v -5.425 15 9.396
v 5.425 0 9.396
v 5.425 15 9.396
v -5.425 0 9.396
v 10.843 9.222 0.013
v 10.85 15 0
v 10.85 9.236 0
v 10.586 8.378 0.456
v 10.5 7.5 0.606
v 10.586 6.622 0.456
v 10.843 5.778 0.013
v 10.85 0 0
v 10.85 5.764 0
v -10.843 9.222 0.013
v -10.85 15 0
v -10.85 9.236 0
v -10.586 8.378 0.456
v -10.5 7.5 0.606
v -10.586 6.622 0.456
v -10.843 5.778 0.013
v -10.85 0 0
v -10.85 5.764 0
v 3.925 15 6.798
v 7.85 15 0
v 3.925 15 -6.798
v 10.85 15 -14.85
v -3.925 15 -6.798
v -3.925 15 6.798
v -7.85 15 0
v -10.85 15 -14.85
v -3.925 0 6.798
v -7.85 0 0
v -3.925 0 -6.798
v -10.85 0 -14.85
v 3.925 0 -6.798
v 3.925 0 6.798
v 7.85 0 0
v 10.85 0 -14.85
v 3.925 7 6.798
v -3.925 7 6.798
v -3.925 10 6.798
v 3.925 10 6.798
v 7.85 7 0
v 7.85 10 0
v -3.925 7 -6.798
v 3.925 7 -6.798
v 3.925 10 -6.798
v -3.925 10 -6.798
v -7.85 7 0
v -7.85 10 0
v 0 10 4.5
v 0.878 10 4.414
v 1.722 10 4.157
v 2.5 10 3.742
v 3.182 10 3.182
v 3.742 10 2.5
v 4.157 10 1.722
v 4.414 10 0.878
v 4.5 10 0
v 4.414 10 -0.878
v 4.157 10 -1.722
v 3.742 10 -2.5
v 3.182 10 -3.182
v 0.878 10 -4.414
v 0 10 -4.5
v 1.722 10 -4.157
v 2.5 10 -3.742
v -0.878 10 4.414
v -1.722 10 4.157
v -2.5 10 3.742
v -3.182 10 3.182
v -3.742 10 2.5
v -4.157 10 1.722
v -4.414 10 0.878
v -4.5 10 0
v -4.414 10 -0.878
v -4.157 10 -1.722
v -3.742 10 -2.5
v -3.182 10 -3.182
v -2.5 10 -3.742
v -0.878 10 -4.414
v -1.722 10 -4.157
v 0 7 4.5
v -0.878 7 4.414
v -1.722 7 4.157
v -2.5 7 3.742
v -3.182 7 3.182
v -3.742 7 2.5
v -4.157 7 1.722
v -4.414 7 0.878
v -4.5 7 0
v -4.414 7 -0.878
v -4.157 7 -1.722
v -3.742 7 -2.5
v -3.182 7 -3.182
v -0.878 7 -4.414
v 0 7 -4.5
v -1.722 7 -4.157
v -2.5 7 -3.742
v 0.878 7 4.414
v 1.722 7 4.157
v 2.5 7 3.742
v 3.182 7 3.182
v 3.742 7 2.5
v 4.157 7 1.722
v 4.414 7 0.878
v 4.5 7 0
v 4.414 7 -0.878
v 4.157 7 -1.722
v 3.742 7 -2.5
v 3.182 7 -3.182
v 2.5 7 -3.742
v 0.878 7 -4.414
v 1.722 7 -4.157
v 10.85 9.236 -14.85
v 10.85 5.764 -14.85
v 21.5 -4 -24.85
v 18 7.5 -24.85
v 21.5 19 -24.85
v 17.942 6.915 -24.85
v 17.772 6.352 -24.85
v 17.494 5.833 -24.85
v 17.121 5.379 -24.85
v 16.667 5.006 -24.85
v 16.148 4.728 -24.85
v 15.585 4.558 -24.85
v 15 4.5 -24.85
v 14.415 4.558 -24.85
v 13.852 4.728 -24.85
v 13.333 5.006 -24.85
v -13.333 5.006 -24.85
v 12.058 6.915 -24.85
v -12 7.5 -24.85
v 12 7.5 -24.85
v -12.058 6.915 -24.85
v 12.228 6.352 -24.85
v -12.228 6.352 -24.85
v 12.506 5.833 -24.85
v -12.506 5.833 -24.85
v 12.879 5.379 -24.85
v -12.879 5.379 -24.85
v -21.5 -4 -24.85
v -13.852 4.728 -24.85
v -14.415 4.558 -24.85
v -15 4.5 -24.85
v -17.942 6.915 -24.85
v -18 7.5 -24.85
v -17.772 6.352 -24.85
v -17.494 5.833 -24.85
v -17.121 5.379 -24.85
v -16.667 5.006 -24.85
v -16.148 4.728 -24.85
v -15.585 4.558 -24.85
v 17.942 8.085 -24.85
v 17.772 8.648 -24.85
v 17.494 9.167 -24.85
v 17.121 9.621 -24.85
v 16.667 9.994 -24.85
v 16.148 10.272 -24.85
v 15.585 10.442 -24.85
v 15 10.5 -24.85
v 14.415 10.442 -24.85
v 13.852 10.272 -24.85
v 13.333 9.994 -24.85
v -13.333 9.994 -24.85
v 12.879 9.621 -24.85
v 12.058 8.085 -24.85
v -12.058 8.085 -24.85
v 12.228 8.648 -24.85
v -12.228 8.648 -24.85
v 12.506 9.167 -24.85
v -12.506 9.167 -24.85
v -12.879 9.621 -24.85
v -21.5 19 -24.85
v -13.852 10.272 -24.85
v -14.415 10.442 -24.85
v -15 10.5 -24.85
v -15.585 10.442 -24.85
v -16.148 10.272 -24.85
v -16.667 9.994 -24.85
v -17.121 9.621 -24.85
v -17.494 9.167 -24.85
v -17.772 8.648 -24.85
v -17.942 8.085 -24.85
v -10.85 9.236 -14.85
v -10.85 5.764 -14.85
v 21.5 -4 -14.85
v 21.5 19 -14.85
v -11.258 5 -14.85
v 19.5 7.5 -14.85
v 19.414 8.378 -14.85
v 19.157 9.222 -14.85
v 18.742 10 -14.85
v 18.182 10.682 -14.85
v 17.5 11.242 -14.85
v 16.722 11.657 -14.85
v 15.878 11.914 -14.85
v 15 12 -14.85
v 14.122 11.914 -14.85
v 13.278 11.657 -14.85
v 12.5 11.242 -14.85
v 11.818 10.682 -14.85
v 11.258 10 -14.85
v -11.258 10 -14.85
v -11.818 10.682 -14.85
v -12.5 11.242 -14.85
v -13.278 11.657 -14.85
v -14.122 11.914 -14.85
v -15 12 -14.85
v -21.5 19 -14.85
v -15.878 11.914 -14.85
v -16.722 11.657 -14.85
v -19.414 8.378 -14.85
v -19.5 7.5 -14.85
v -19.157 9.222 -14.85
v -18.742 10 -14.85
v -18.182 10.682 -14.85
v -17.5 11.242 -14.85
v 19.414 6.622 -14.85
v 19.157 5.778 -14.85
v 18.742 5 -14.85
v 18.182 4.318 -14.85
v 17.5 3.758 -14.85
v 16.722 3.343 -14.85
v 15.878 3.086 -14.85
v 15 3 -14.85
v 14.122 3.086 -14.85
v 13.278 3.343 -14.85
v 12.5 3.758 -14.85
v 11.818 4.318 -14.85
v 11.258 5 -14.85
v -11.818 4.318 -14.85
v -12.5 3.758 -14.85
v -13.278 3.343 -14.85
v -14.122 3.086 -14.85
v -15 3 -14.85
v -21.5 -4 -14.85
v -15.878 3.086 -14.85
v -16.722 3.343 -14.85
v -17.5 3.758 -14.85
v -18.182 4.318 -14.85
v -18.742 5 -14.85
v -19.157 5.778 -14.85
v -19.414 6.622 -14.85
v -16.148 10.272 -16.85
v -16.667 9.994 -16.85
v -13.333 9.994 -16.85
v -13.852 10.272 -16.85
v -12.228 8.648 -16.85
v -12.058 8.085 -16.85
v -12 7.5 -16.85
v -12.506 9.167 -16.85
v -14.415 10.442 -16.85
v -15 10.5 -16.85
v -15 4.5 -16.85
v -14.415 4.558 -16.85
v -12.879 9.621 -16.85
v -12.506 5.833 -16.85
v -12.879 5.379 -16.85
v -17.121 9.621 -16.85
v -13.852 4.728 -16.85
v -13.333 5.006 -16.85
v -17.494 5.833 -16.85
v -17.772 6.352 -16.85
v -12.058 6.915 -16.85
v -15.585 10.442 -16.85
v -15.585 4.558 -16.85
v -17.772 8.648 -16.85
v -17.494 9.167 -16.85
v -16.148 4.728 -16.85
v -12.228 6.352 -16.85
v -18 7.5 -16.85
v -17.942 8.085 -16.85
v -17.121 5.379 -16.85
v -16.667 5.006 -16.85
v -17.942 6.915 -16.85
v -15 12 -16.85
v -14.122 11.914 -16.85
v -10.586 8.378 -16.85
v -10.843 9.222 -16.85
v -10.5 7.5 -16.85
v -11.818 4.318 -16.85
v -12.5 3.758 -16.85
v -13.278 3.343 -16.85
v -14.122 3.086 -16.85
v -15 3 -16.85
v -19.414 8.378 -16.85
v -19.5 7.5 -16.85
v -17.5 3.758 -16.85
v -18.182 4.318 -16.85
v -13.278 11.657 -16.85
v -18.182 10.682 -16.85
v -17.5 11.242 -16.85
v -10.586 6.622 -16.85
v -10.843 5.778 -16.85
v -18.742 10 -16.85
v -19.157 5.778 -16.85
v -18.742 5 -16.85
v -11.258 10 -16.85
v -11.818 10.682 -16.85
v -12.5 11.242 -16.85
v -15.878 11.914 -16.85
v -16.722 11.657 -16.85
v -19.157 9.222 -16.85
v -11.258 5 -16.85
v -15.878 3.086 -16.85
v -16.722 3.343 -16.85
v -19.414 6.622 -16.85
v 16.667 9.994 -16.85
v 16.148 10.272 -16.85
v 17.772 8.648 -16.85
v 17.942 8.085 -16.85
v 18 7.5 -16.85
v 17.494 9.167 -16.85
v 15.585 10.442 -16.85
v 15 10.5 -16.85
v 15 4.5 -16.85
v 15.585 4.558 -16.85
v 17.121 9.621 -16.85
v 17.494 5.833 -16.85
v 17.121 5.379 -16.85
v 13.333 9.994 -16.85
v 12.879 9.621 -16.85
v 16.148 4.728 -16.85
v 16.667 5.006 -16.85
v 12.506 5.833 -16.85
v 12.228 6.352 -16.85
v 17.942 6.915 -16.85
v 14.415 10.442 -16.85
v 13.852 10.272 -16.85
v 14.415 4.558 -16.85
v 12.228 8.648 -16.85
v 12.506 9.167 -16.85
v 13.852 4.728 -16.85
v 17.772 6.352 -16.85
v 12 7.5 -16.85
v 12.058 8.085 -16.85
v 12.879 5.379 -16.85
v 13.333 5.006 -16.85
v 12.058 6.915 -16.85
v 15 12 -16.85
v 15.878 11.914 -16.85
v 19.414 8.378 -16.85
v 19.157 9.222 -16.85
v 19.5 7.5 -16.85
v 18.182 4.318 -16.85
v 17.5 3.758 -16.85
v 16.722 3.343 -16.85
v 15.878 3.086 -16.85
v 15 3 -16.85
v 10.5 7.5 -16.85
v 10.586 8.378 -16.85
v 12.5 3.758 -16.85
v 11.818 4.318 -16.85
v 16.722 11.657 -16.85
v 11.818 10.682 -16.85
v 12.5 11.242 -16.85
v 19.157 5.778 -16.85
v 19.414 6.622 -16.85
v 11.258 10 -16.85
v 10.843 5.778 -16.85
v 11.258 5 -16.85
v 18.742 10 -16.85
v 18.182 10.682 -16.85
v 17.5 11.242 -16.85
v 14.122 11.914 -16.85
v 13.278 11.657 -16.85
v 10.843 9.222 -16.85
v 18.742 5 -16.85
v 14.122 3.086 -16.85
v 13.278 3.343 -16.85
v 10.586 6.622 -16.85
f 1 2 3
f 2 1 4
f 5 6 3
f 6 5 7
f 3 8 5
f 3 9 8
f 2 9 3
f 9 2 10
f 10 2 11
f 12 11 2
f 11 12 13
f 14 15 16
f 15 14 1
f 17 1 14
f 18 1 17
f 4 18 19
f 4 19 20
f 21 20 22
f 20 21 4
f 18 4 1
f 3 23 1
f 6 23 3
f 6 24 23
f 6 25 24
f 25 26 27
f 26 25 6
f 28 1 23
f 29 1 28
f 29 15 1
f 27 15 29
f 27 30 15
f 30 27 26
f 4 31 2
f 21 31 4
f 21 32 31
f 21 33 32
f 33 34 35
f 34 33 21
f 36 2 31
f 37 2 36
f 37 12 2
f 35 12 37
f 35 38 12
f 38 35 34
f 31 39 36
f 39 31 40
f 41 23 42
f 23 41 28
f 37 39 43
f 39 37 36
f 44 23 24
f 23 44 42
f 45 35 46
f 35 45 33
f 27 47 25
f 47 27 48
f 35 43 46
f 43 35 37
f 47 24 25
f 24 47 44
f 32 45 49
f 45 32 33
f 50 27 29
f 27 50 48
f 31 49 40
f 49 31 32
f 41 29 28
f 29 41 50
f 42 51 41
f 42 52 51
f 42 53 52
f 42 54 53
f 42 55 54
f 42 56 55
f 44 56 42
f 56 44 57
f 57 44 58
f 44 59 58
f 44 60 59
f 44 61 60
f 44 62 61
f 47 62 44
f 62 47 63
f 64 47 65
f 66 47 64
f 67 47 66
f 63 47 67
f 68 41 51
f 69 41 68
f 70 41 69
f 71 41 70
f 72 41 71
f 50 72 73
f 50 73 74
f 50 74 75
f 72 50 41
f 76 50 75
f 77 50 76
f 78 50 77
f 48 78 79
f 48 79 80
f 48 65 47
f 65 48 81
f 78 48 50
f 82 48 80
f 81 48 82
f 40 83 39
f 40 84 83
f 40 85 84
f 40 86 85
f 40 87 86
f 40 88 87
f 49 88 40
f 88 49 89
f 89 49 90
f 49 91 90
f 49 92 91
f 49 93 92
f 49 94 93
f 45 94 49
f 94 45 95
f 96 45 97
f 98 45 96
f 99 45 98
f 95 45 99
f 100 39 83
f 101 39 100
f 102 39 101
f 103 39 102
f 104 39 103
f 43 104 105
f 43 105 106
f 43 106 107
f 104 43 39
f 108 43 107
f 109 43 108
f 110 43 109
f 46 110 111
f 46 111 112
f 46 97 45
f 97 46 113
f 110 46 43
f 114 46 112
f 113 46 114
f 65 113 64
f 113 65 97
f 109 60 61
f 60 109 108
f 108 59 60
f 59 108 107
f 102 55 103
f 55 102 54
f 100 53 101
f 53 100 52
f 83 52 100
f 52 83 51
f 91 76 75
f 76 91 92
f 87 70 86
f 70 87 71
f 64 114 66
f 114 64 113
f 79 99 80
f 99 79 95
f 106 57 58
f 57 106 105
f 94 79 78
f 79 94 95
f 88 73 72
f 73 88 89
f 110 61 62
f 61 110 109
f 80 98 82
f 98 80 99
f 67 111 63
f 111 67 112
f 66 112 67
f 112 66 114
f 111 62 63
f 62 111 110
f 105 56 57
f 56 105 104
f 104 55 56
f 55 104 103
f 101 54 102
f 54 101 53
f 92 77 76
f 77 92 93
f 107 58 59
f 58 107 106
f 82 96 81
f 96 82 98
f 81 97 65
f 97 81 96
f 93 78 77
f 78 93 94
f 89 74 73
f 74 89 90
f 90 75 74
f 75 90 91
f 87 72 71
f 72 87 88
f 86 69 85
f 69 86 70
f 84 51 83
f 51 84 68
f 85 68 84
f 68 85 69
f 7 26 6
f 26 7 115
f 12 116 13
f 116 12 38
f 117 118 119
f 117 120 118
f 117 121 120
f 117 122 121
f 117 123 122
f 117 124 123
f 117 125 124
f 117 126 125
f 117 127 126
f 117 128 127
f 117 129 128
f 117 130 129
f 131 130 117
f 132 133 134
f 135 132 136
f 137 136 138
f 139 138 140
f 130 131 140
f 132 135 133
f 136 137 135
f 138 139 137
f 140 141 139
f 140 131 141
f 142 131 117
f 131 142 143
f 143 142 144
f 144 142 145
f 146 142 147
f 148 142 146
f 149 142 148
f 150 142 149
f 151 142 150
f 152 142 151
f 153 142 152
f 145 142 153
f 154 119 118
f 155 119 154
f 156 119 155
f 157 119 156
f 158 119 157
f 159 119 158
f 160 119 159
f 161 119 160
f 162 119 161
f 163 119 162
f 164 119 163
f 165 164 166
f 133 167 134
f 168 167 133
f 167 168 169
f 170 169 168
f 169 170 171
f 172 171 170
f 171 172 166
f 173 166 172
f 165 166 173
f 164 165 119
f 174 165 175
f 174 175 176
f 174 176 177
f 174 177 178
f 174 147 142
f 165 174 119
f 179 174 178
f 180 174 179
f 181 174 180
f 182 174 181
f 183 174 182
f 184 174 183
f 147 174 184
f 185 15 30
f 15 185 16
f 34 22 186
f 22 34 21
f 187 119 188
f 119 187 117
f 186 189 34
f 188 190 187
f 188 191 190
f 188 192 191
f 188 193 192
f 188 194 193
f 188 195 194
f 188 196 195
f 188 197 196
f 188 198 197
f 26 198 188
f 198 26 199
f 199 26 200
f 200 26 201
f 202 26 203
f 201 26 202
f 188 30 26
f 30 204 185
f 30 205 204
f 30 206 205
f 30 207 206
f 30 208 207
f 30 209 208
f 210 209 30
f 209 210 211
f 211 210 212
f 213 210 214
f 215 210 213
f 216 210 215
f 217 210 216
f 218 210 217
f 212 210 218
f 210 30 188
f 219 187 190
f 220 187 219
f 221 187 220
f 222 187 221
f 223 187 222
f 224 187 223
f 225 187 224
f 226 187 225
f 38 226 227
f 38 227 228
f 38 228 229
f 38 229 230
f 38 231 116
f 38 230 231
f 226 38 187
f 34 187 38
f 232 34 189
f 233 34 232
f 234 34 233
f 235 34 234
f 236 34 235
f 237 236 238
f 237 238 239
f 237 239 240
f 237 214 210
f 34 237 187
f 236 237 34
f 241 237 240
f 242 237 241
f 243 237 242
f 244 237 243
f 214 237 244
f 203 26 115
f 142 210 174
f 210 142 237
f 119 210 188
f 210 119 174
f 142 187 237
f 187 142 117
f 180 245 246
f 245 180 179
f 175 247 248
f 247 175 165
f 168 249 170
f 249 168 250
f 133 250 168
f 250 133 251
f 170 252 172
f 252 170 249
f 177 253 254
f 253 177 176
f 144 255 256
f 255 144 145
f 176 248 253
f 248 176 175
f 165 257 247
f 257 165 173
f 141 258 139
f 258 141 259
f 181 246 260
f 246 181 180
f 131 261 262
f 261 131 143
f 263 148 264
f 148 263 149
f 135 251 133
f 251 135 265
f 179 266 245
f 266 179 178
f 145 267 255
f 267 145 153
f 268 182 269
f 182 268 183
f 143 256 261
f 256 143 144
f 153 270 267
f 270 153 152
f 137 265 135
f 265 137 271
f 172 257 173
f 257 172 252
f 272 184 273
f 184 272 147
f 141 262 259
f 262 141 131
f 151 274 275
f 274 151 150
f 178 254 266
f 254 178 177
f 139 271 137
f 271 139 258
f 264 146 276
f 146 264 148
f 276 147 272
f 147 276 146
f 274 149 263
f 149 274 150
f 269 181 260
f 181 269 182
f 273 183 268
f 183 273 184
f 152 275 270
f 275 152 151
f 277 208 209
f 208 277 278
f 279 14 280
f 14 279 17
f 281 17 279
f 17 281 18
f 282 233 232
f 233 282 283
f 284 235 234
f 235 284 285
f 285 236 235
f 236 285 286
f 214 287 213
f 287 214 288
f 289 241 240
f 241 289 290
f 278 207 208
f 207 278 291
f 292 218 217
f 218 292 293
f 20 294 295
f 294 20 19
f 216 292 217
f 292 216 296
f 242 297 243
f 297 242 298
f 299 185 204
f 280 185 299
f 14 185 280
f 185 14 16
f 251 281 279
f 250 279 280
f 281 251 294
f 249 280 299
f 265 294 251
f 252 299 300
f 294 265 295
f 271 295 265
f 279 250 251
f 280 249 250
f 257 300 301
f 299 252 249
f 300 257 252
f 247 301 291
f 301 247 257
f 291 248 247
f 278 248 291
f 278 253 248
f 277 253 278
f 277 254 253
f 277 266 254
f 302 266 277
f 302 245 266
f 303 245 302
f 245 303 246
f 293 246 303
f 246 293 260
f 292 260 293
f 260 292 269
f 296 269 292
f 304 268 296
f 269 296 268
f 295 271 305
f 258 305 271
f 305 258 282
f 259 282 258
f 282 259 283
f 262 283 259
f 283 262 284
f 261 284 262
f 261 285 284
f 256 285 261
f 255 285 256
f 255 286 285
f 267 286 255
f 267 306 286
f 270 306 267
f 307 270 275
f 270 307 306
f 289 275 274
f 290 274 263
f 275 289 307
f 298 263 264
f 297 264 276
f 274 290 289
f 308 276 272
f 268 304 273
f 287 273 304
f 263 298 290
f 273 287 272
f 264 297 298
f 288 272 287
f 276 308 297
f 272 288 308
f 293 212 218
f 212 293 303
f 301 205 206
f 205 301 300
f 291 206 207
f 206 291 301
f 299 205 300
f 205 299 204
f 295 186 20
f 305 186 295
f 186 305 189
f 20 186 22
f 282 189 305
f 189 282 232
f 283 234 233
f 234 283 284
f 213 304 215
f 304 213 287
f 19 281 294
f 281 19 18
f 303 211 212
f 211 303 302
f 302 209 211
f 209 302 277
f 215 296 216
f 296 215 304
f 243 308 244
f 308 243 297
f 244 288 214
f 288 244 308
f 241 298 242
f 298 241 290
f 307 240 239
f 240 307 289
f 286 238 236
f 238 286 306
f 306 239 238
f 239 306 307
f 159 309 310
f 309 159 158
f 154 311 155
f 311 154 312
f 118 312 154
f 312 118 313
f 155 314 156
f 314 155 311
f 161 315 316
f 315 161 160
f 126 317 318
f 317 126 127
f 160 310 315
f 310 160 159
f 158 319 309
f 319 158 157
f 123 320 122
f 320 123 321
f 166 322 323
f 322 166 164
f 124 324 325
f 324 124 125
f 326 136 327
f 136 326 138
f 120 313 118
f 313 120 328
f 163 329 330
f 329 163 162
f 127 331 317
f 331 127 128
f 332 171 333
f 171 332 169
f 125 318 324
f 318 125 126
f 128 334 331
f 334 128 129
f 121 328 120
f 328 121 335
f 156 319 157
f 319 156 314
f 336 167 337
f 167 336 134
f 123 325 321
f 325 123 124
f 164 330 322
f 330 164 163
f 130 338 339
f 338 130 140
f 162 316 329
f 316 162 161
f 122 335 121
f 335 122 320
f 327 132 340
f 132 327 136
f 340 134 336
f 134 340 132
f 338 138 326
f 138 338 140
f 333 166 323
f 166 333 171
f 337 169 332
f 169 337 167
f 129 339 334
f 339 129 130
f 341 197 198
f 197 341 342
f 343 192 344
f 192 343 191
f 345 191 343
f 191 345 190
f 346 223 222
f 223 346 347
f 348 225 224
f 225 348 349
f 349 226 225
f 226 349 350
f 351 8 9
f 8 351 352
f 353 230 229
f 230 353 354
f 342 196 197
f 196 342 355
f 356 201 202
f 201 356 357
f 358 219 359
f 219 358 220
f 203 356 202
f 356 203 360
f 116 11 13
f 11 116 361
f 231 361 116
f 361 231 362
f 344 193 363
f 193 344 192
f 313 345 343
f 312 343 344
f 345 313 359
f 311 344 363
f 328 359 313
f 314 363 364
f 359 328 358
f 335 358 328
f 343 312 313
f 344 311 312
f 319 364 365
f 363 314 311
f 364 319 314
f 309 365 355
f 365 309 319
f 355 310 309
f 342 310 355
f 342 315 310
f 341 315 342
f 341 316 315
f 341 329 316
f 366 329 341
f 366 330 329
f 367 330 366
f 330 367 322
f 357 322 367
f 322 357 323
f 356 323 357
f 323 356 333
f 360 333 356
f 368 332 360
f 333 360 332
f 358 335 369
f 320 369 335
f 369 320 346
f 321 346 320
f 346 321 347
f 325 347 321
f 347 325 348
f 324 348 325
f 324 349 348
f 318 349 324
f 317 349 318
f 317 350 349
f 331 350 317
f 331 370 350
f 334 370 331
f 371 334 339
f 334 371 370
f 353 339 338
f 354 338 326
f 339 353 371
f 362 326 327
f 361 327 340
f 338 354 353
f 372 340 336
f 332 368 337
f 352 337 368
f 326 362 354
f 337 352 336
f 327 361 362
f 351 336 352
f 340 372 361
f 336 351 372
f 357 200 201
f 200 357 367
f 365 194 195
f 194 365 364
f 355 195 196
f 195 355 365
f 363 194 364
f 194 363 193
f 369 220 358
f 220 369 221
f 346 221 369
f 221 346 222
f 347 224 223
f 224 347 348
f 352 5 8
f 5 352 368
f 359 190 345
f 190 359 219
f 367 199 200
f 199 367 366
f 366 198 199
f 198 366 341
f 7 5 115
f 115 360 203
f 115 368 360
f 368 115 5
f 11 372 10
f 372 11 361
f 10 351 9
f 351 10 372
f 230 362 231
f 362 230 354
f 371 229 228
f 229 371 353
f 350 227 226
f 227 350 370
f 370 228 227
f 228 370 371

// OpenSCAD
m8_shaft_diameter = 9;
m8_nut_diameter = 15.7;
m8_pocket_depth = 7;
nut_holder_len = 15/*30*/;
nut_holder_wall = 3;
nut_bottom_wall = 3;
nut_holder_outer_diam = m8_nut_diameter+2*nut_holder_wall;
nut_holder_flat_diam = nut_holder_outer_diam/(2*sqrt(1+(1/3)));

module leadscrew_nut_holder() {
	// rotate so hexagon is along positive y axis
	rotate([-90,0,0]){
		difference() {
			union() {
				// main hut holder profile
				difference() {
					// outer hexagon
					cylinder(r=nut_holder_outer_diam/2, h=nut_holder_len, $fn=6);
					// cut out inner hexagon at size of expected nut
					translate([0,0,-1])
						cylinder(r=m8_nut_diameter/2, h=nut_holder_len+2, $fn=6);
				}
				// wall below top nut
				translate([0,0,m8_pocket_depth])
					cylinder(r=nut_holder_outer_diam/2, h=nut_bottom_wall, $fn=6); 
			}
			// cut out shaft hole
			cylinder(r=m8_shaft_diameter/2, h=nut_holder_len, $fn=32);
		}
	}
}

module leadscrew_nut_holder_profile() {
	// rotate so hexagon is along positive y axis
	rotate([-90,0,0])
		// outer hexagon only
		translate([0,0,-1])
			cylinder(r=nut_holder_outer_diam/2, h=nut_holder_len+2, $fn=6);
}

m5_shaft_diam = 6;
m5_head_diam = 9;
m5_head_inset_adjust = -2; // use to move screw up/down to accomodate screws we have
m5_head_inset = 3 + m5_head_inset_adjust;

dist_to_wheel = 13/*10*/;
half_wheel = 11/2;
wheel_spacer = 25.4/4 /* 1/4" */;
x_axis_plate_thick = 0/*6*/;  // now assuming acrylic spacer under this
dist_fine_tune = 0;

dist_to_shaft = dist_to_wheel+half_wheel+wheel_spacer+x_axis_plate_thick+dist_fine_tune;
block_margin = 2;
mounting_spread_w = 30;
mounting_spread_h = 10/*20*/;
block_base_w = mounting_spread_w+m5_head_diam+2*block_margin;
block_base_h = mounting_spread_h+m5_head_diam+2*block_margin;
block_base_thick = 10;

module leadscrew_block() { 
    	difference() {
		union() {
			// nut holder
			leadscrew_nut_holder();
			// center support block under nut holder
			difference() {
				translate([-nut_holder_outer_diam/2,0,-dist_to_shaft])
					cube([nut_holder_outer_diam,nut_holder_len,dist_to_shaft]);
				leadscrew_nut_holder_profile();
			}
			// mounting block base
			translate([-block_base_w/2,
										-(block_base_h-nut_holder_len)/2,-dist_to_shaft]) 
				cube([block_base_w,block_base_h,block_base_thick]);
		}
		// mounting holes
		translate([-block_base_w/2,
										-(block_base_h-nut_holder_len)/2,-dist_to_shaft]) 
		translate([m5_head_diam/2+block_margin, m5_head_diam/2+block_margin, -1]) 
		union() {
			for (xoff=[0,mounting_spread_w]) {
                for (yoff=[/*0,*/mounting_spread_h/2/*,mounting_spread_h*/]) {
					translate([xoff,yoff,0]) {
					// bolt hole
					cylinder(r=m5_shaft_diam/2, h=block_base_thick+2,$fn=32);
					// countersink for head
					translate([0,0,block_base_thick-m5_head_inset])
						cylinder(r=m5_head_diam/2, h=500,$fn=32);
					}
				}
			}
		}
	}
}

leadscrew_block();
